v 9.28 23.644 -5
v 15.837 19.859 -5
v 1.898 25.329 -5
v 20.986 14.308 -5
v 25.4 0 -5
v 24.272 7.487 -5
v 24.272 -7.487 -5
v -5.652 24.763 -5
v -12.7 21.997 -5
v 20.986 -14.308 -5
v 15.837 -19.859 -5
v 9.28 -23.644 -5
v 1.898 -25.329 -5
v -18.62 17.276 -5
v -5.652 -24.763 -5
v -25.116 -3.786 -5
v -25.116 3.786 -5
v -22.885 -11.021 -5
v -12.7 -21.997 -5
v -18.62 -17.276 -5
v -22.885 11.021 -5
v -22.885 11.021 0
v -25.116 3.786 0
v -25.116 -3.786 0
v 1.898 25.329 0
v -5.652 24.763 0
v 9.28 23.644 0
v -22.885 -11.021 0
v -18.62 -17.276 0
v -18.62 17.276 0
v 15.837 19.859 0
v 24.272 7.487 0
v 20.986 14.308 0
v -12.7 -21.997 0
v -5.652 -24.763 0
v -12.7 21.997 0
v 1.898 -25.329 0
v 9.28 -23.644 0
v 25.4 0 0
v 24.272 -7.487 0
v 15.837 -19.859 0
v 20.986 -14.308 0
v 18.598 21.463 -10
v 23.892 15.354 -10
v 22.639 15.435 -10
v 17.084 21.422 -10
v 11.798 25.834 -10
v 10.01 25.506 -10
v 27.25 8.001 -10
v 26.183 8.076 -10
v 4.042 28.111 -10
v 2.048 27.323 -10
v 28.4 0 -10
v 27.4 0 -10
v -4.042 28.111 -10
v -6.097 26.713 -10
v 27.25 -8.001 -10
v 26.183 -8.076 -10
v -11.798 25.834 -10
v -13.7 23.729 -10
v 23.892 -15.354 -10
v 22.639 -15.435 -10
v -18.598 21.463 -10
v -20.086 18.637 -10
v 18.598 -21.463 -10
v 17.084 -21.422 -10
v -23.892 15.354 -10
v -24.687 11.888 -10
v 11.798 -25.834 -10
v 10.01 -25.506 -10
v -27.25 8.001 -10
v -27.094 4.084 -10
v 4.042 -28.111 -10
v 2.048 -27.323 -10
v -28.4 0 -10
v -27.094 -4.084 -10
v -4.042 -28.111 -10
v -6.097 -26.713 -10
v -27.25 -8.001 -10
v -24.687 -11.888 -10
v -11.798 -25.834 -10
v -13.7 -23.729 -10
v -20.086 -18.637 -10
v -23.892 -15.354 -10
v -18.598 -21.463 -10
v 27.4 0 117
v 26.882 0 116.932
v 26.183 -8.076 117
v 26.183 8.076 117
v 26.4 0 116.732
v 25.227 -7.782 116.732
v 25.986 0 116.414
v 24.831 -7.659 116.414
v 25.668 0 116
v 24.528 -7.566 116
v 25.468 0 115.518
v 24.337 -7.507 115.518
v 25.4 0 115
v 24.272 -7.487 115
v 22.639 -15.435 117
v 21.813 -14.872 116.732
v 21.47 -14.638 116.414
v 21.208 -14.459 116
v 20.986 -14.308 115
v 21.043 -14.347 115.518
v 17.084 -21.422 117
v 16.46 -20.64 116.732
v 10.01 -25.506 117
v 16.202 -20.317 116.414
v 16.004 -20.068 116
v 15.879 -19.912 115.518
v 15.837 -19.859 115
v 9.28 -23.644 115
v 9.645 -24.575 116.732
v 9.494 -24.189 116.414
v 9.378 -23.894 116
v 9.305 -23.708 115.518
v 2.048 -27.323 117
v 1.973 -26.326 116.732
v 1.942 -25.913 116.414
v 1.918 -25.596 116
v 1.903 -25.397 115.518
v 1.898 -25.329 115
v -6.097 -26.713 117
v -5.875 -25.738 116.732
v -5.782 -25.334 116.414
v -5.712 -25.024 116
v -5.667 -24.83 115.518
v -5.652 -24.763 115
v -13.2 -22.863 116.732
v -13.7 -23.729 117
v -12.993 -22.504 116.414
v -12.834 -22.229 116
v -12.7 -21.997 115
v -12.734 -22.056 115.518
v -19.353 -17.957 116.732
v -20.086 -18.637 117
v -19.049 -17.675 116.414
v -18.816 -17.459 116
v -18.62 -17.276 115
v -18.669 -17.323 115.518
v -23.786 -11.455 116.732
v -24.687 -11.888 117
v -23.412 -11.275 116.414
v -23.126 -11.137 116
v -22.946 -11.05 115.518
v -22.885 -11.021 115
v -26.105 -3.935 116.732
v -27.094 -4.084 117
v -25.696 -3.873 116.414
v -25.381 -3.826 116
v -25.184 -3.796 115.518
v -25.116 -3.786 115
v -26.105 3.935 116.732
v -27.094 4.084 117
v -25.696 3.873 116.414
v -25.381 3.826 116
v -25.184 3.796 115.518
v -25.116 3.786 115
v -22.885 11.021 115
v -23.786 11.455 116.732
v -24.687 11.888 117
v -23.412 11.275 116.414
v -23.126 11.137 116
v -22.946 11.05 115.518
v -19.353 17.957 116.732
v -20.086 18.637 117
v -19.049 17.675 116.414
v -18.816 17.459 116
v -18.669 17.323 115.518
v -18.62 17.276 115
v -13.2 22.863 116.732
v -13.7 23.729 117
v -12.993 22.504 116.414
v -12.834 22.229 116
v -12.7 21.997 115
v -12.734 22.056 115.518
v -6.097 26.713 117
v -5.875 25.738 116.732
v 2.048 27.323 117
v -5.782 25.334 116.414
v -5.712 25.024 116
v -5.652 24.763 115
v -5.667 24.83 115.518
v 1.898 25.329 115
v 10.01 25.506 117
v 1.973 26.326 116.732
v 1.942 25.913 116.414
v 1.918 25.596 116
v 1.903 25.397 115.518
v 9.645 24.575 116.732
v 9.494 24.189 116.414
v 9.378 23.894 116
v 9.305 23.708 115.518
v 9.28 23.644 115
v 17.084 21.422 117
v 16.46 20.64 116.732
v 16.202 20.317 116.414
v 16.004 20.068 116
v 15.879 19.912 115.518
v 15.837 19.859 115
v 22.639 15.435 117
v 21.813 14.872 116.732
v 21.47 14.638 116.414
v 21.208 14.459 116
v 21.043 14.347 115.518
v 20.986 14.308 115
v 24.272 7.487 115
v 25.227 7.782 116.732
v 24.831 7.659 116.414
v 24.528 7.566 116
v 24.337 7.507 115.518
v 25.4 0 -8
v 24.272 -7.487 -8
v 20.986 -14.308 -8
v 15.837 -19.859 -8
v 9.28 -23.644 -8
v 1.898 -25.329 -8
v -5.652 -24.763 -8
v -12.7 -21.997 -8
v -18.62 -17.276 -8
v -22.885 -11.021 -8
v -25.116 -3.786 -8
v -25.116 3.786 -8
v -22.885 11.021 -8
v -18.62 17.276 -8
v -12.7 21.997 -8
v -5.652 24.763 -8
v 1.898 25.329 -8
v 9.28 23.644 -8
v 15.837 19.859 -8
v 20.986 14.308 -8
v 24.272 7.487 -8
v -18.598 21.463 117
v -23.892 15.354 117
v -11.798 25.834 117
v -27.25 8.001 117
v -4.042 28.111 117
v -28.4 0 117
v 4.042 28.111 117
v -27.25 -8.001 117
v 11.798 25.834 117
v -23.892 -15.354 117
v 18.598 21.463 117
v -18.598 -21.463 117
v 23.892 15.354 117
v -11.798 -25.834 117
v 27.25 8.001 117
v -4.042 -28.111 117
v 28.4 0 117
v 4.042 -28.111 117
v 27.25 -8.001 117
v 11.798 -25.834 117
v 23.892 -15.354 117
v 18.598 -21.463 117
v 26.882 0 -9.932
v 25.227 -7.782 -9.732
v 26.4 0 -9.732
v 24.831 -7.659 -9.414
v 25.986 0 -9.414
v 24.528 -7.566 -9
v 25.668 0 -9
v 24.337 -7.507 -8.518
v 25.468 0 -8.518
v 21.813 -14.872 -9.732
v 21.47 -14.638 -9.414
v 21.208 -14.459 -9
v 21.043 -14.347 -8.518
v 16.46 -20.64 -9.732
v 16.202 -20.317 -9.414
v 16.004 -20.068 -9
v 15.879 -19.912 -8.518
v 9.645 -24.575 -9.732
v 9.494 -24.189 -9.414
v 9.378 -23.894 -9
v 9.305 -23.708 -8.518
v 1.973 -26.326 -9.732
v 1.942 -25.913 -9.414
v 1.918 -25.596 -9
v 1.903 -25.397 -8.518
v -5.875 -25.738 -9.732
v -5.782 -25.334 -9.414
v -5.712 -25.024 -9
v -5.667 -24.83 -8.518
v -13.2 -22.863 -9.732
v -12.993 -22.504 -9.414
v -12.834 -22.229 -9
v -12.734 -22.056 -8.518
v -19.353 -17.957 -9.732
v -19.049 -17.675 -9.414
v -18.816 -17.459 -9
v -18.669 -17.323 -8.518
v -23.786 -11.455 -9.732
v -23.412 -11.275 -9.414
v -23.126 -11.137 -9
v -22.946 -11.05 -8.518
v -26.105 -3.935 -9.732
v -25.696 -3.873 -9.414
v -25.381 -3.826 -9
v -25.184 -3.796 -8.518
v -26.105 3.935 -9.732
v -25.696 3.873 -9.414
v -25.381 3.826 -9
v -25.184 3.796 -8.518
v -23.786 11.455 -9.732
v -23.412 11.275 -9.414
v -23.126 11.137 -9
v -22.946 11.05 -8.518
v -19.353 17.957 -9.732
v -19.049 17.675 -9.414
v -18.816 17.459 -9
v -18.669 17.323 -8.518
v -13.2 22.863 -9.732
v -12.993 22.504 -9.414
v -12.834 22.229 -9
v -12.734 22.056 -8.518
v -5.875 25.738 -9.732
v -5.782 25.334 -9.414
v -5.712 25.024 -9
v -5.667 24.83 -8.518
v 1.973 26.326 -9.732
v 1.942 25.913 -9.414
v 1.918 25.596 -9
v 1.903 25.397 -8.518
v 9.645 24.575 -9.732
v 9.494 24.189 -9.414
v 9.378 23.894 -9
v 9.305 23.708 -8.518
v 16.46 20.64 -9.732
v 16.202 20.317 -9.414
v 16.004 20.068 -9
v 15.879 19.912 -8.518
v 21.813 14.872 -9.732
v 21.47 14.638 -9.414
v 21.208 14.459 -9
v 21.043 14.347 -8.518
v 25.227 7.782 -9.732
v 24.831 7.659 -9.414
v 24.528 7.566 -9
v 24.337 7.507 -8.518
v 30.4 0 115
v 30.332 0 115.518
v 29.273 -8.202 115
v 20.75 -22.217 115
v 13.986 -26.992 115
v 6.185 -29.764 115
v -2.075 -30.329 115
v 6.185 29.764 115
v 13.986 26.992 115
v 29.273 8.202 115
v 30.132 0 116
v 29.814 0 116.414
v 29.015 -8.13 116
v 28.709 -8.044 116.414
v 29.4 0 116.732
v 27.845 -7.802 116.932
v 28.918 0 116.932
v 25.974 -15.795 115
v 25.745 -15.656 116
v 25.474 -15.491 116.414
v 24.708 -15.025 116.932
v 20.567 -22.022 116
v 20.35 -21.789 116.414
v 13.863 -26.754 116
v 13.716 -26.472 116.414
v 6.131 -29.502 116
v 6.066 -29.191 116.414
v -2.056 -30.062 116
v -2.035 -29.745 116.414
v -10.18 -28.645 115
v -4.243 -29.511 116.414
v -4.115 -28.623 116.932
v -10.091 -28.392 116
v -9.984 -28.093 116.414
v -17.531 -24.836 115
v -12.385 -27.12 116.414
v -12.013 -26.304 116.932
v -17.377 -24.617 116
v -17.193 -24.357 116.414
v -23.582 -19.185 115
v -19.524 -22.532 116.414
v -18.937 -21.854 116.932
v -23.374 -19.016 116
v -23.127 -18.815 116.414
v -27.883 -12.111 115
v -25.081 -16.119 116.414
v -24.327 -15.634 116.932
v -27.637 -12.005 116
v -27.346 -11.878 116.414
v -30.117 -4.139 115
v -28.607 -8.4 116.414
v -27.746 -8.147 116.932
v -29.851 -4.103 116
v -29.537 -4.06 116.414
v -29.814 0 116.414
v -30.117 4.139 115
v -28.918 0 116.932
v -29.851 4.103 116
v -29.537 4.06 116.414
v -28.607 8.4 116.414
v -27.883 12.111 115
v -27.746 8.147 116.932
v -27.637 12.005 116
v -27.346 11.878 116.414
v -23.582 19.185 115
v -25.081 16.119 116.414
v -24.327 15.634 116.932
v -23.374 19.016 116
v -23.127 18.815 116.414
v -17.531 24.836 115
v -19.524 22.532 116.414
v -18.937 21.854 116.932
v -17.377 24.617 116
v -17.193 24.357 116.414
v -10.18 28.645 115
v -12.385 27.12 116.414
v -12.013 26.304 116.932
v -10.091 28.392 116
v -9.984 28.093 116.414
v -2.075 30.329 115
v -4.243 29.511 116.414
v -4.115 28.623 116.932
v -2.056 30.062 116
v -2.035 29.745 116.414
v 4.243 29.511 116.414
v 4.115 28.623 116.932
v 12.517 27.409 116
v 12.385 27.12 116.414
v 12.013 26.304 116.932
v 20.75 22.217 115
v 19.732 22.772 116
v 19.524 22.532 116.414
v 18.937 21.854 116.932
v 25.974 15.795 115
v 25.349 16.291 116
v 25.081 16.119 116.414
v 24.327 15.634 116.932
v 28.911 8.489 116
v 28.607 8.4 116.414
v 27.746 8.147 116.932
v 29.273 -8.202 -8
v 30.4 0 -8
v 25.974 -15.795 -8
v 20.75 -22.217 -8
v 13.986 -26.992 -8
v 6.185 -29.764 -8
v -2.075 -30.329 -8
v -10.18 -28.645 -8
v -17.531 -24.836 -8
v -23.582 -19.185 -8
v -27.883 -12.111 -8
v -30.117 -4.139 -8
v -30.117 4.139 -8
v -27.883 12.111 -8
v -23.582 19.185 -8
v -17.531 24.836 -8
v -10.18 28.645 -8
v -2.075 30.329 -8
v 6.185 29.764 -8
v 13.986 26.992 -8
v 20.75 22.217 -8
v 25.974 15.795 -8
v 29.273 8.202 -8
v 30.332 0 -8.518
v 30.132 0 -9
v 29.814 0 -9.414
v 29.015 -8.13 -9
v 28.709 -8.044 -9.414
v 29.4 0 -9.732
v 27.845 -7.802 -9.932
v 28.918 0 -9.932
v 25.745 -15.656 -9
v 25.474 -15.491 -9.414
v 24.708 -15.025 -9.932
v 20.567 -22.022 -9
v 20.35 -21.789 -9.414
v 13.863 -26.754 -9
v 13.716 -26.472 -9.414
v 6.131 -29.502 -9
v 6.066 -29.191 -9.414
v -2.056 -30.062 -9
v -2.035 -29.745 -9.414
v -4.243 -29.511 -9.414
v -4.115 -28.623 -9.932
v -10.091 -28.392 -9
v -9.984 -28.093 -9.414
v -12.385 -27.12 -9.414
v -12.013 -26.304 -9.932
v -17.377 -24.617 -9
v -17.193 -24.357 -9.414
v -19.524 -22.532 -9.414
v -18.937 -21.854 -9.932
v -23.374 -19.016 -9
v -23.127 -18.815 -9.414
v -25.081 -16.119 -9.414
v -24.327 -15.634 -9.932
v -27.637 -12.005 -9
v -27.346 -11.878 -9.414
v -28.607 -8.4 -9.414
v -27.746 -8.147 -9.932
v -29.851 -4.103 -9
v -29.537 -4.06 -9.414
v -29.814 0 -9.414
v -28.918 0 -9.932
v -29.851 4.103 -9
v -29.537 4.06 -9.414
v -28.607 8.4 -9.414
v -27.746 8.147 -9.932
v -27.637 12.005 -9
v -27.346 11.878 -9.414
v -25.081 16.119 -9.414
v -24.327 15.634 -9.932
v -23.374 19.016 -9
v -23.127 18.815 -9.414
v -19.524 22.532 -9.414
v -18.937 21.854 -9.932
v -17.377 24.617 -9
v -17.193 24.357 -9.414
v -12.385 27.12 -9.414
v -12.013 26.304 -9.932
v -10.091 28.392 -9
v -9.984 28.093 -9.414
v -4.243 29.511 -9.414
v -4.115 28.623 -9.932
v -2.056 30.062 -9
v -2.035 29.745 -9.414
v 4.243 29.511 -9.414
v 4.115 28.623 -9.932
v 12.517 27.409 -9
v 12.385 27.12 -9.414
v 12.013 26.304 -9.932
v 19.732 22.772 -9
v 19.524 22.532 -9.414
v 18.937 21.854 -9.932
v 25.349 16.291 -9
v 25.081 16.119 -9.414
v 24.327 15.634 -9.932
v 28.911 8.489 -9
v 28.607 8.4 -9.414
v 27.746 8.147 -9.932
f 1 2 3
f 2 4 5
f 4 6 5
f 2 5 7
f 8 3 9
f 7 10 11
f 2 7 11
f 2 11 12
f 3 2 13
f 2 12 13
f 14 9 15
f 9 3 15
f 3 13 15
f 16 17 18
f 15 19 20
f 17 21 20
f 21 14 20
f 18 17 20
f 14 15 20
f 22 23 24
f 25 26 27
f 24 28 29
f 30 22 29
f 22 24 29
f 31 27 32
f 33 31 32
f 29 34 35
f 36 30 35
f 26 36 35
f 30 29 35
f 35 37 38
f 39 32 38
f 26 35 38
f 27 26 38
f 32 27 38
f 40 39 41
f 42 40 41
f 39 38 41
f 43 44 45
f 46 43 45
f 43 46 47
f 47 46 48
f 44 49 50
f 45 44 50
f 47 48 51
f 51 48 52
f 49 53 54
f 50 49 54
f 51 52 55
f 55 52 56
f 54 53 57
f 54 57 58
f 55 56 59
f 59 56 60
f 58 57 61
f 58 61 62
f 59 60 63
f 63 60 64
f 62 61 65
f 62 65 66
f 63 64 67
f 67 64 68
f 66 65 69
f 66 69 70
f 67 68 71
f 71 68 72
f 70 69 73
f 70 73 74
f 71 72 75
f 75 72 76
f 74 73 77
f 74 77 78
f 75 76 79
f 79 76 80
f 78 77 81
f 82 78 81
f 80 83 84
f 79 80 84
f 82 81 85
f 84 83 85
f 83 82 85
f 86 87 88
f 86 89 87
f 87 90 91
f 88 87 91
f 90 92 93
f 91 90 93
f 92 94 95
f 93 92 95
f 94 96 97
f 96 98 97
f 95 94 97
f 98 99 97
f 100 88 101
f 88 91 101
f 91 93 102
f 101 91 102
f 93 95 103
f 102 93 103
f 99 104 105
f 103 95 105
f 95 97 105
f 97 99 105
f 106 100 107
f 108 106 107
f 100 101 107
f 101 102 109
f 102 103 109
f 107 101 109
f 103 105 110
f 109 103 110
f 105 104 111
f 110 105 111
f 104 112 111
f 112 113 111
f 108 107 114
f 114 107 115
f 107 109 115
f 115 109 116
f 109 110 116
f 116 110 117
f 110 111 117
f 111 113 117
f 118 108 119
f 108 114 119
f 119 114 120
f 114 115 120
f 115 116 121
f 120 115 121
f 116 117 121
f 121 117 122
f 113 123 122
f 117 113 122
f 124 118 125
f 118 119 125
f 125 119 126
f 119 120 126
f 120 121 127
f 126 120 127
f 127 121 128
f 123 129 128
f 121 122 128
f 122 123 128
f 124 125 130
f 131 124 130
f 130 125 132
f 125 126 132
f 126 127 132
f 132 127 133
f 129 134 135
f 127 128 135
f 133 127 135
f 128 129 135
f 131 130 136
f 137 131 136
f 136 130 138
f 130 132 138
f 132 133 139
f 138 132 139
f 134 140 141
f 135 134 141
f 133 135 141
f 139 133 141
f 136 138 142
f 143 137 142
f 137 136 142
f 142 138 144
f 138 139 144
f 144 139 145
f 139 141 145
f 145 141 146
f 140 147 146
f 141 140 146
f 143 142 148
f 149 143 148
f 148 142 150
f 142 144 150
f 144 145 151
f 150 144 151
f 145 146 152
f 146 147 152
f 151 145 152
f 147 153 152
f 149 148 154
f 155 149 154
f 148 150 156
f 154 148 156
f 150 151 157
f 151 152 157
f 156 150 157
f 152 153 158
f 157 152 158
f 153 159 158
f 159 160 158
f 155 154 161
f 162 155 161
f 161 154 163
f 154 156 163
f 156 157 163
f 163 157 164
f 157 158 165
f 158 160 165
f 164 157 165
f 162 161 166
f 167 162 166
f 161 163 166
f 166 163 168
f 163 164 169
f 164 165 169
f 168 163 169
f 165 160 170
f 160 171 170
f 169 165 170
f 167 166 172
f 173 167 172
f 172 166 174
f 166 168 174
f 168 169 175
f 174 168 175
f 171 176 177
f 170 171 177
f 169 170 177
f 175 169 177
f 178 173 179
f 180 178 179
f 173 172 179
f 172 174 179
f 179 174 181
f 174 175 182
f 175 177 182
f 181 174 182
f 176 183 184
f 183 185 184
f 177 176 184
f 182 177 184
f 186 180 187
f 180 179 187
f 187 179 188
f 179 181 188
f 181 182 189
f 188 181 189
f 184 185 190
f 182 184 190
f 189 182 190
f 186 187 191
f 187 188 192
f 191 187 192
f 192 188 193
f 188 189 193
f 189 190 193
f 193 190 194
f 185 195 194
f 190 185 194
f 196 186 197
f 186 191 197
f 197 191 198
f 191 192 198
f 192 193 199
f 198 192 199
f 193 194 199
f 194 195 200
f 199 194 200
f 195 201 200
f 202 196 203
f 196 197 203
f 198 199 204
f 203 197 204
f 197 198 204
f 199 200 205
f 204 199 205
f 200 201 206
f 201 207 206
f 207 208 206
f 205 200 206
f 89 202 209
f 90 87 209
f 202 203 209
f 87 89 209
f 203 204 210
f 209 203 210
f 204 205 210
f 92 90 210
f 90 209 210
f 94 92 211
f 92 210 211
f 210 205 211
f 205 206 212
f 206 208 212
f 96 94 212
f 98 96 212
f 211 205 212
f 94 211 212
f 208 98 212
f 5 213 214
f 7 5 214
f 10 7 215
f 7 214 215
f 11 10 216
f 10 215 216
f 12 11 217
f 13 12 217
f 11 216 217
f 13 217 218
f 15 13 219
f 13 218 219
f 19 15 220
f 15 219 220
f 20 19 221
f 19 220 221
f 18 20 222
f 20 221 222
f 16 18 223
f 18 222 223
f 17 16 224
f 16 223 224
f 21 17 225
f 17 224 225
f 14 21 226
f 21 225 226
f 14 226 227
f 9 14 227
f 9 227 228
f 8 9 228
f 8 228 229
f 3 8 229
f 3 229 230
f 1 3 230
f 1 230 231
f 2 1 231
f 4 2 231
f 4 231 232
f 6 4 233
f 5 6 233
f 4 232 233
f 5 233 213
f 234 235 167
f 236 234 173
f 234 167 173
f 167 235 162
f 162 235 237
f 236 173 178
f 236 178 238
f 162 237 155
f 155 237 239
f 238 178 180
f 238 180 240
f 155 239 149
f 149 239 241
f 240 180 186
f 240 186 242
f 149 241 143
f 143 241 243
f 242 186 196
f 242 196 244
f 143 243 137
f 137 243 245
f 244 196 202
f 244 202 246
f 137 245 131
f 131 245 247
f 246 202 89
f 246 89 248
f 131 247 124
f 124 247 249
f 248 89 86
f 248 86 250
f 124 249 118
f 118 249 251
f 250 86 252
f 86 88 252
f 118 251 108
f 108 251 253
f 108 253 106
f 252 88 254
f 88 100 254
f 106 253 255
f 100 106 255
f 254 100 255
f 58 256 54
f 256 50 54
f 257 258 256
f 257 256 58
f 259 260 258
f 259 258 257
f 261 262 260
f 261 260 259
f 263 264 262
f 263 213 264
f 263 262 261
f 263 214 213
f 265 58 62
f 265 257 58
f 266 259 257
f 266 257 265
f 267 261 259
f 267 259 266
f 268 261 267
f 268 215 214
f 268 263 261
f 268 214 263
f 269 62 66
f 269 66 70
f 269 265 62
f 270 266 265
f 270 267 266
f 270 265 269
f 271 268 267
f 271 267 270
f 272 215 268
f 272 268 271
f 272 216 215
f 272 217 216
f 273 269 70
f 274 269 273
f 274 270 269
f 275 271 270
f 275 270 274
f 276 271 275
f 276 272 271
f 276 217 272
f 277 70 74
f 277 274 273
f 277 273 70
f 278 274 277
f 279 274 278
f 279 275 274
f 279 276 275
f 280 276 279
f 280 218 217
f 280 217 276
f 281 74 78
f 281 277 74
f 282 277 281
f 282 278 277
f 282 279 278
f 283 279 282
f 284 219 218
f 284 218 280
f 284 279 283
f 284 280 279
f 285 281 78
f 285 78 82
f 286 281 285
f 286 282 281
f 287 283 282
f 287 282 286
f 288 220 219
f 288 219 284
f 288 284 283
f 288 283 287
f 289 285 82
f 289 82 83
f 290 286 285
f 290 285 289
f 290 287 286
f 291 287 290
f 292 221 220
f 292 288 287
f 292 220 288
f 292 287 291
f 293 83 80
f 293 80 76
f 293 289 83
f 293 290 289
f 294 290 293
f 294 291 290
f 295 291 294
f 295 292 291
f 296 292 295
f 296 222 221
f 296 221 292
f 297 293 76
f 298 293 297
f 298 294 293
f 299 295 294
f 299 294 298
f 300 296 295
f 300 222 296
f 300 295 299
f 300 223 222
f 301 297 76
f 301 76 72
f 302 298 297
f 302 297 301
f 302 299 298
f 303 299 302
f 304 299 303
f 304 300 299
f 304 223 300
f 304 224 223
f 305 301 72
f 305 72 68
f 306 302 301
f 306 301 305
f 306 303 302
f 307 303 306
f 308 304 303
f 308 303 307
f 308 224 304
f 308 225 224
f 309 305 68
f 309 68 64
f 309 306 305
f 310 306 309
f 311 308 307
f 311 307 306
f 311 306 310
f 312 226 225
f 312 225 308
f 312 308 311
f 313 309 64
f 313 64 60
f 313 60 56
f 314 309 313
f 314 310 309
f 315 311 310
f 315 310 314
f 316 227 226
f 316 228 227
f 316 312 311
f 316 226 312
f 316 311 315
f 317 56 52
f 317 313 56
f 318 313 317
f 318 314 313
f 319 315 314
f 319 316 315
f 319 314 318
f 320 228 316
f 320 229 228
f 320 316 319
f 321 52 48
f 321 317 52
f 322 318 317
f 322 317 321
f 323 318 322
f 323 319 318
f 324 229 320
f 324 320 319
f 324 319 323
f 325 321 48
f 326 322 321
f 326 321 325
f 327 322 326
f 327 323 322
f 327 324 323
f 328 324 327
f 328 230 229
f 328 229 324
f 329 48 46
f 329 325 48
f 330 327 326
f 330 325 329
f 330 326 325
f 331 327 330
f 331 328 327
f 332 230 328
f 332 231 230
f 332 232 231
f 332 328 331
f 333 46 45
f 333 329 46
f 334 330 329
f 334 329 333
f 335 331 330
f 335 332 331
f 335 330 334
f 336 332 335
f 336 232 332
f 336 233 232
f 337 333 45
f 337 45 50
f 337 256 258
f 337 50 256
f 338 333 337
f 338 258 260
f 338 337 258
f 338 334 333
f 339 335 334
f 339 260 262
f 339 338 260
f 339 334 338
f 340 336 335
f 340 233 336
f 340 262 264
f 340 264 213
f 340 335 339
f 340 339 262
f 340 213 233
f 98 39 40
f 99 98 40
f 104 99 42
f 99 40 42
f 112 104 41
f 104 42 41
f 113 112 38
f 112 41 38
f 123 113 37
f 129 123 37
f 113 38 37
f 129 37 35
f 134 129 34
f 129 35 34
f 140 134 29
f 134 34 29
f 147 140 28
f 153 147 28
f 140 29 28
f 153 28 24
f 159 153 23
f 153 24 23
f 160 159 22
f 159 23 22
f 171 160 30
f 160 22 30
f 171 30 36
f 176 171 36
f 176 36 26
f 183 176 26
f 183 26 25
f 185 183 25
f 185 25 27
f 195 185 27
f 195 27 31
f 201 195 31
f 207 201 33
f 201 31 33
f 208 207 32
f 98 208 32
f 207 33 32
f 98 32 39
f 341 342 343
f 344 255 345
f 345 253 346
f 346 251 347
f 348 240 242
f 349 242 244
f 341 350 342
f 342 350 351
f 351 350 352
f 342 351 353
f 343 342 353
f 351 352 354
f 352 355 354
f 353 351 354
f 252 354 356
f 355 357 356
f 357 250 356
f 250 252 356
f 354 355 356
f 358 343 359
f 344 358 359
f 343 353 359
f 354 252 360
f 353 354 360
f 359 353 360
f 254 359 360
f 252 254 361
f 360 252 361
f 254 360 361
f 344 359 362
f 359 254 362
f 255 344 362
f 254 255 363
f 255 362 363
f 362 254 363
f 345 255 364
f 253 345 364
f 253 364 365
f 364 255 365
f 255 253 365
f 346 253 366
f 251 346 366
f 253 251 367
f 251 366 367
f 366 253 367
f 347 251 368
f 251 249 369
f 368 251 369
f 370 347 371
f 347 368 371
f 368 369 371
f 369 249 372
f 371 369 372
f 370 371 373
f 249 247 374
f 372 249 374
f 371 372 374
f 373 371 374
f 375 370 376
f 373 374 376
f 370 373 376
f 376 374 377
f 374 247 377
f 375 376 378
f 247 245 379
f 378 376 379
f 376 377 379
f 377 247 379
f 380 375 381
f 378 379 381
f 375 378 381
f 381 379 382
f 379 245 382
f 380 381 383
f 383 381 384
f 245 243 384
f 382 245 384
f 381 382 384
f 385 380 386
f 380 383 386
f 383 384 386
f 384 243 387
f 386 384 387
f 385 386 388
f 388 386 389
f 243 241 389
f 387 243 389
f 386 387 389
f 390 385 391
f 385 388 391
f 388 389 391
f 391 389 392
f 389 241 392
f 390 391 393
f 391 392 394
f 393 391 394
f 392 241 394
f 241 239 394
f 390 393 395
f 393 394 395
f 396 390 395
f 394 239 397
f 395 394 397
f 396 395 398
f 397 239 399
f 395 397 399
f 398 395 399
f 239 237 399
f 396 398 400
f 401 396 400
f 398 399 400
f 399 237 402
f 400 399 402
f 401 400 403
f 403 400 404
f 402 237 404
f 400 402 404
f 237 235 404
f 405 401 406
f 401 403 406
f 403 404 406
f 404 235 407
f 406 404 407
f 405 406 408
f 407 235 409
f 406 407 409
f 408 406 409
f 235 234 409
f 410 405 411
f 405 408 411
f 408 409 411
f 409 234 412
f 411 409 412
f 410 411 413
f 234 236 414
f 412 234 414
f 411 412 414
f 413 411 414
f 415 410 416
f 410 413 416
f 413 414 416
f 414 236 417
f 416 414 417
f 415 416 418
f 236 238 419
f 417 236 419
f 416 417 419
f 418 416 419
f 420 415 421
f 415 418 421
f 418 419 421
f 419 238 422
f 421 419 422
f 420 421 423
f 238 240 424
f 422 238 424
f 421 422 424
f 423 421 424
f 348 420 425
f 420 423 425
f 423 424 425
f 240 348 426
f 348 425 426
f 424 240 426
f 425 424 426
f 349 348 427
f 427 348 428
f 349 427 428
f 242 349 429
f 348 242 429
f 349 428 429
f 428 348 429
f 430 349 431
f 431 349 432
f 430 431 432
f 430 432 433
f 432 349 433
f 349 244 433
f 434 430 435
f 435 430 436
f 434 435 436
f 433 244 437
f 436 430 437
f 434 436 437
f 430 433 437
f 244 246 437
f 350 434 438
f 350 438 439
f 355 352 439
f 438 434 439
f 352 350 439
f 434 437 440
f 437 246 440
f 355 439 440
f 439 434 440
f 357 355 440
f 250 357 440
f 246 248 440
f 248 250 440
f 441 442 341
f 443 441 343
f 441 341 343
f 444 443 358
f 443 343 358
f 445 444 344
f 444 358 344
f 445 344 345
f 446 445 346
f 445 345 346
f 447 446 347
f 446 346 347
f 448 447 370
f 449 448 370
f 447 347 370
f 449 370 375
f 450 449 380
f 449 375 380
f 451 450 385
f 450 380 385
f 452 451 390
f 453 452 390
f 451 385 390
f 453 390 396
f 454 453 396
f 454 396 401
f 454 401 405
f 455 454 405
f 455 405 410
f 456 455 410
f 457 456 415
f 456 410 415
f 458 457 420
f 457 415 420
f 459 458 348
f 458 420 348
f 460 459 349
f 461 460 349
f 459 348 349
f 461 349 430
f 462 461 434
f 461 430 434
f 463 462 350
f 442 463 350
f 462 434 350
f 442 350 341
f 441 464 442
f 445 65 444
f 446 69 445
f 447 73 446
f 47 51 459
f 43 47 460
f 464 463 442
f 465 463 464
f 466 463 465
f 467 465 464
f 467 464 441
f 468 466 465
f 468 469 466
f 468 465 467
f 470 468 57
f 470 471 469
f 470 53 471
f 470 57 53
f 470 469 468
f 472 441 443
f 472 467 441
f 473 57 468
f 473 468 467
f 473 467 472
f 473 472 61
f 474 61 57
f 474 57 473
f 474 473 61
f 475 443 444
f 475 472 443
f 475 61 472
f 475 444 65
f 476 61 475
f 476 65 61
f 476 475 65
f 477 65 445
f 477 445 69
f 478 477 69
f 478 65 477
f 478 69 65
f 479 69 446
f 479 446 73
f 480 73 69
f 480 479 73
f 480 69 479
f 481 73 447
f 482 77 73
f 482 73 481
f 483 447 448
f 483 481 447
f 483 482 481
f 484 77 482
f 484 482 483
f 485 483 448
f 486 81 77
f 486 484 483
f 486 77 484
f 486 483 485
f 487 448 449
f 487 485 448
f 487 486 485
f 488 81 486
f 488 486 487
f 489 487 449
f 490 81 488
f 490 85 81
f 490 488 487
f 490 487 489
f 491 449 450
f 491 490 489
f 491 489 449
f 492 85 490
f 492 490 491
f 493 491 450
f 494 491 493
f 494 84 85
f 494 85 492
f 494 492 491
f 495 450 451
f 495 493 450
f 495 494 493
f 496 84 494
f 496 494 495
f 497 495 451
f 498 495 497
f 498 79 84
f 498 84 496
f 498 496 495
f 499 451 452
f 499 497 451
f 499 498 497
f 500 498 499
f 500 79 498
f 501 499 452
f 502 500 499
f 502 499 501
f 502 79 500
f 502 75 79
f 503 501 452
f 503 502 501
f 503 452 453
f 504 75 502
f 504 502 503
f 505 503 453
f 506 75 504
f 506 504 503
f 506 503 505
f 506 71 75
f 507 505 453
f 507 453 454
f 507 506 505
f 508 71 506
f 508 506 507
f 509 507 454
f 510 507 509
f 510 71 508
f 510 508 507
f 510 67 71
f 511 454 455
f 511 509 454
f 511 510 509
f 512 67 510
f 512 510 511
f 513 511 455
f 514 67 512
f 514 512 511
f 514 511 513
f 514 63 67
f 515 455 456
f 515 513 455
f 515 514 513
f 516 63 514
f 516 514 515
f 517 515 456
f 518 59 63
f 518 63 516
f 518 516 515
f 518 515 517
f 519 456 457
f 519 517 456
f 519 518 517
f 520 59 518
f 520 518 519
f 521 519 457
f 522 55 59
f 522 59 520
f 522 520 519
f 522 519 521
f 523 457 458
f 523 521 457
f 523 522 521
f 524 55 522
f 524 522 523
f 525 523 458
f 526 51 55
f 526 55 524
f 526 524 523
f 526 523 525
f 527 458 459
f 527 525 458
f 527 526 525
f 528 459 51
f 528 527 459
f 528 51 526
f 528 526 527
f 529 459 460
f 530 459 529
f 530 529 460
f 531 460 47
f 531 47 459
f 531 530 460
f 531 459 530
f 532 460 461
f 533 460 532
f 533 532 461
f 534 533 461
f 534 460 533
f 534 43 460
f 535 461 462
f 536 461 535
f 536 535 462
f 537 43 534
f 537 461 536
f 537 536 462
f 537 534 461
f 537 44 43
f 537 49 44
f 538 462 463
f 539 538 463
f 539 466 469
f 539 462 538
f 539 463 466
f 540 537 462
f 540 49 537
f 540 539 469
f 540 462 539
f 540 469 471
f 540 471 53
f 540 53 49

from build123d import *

# Parameters (mm, degrees)
F3_R = 2
F4_R = 2


with BuildPart() as f2:
    # F1 (on Front) → F2 (revolve)
    with BuildSketch(Plane.XZ):
        Polygon((25.4, 0), (0, 0), (0, -5), (25.4, -5), (25.4, -10), (30.4, -10), (30.4, 117), (25.4, 117), align=None)
    revolve(axis=Axis((0, 0, 13.367524), (0, 0, -1)))

    # F3
    f3_edges = [f2.edges().sort_by_distance(p)[0] for p in [
        (-30.4, 0, 117),
        (-25.4, 0, 117),
    ]]
    fillet(f3_edges, radius=F3_R)

    # F4
    f4_edges = [f2.edges().sort_by_distance(p)[0] for p in [
        (-25.4, 0, -10),
        (-30.4, 0, -10),
    ]]
    fillet(f4_edges, radius=F4_R)


solid = f2.part
